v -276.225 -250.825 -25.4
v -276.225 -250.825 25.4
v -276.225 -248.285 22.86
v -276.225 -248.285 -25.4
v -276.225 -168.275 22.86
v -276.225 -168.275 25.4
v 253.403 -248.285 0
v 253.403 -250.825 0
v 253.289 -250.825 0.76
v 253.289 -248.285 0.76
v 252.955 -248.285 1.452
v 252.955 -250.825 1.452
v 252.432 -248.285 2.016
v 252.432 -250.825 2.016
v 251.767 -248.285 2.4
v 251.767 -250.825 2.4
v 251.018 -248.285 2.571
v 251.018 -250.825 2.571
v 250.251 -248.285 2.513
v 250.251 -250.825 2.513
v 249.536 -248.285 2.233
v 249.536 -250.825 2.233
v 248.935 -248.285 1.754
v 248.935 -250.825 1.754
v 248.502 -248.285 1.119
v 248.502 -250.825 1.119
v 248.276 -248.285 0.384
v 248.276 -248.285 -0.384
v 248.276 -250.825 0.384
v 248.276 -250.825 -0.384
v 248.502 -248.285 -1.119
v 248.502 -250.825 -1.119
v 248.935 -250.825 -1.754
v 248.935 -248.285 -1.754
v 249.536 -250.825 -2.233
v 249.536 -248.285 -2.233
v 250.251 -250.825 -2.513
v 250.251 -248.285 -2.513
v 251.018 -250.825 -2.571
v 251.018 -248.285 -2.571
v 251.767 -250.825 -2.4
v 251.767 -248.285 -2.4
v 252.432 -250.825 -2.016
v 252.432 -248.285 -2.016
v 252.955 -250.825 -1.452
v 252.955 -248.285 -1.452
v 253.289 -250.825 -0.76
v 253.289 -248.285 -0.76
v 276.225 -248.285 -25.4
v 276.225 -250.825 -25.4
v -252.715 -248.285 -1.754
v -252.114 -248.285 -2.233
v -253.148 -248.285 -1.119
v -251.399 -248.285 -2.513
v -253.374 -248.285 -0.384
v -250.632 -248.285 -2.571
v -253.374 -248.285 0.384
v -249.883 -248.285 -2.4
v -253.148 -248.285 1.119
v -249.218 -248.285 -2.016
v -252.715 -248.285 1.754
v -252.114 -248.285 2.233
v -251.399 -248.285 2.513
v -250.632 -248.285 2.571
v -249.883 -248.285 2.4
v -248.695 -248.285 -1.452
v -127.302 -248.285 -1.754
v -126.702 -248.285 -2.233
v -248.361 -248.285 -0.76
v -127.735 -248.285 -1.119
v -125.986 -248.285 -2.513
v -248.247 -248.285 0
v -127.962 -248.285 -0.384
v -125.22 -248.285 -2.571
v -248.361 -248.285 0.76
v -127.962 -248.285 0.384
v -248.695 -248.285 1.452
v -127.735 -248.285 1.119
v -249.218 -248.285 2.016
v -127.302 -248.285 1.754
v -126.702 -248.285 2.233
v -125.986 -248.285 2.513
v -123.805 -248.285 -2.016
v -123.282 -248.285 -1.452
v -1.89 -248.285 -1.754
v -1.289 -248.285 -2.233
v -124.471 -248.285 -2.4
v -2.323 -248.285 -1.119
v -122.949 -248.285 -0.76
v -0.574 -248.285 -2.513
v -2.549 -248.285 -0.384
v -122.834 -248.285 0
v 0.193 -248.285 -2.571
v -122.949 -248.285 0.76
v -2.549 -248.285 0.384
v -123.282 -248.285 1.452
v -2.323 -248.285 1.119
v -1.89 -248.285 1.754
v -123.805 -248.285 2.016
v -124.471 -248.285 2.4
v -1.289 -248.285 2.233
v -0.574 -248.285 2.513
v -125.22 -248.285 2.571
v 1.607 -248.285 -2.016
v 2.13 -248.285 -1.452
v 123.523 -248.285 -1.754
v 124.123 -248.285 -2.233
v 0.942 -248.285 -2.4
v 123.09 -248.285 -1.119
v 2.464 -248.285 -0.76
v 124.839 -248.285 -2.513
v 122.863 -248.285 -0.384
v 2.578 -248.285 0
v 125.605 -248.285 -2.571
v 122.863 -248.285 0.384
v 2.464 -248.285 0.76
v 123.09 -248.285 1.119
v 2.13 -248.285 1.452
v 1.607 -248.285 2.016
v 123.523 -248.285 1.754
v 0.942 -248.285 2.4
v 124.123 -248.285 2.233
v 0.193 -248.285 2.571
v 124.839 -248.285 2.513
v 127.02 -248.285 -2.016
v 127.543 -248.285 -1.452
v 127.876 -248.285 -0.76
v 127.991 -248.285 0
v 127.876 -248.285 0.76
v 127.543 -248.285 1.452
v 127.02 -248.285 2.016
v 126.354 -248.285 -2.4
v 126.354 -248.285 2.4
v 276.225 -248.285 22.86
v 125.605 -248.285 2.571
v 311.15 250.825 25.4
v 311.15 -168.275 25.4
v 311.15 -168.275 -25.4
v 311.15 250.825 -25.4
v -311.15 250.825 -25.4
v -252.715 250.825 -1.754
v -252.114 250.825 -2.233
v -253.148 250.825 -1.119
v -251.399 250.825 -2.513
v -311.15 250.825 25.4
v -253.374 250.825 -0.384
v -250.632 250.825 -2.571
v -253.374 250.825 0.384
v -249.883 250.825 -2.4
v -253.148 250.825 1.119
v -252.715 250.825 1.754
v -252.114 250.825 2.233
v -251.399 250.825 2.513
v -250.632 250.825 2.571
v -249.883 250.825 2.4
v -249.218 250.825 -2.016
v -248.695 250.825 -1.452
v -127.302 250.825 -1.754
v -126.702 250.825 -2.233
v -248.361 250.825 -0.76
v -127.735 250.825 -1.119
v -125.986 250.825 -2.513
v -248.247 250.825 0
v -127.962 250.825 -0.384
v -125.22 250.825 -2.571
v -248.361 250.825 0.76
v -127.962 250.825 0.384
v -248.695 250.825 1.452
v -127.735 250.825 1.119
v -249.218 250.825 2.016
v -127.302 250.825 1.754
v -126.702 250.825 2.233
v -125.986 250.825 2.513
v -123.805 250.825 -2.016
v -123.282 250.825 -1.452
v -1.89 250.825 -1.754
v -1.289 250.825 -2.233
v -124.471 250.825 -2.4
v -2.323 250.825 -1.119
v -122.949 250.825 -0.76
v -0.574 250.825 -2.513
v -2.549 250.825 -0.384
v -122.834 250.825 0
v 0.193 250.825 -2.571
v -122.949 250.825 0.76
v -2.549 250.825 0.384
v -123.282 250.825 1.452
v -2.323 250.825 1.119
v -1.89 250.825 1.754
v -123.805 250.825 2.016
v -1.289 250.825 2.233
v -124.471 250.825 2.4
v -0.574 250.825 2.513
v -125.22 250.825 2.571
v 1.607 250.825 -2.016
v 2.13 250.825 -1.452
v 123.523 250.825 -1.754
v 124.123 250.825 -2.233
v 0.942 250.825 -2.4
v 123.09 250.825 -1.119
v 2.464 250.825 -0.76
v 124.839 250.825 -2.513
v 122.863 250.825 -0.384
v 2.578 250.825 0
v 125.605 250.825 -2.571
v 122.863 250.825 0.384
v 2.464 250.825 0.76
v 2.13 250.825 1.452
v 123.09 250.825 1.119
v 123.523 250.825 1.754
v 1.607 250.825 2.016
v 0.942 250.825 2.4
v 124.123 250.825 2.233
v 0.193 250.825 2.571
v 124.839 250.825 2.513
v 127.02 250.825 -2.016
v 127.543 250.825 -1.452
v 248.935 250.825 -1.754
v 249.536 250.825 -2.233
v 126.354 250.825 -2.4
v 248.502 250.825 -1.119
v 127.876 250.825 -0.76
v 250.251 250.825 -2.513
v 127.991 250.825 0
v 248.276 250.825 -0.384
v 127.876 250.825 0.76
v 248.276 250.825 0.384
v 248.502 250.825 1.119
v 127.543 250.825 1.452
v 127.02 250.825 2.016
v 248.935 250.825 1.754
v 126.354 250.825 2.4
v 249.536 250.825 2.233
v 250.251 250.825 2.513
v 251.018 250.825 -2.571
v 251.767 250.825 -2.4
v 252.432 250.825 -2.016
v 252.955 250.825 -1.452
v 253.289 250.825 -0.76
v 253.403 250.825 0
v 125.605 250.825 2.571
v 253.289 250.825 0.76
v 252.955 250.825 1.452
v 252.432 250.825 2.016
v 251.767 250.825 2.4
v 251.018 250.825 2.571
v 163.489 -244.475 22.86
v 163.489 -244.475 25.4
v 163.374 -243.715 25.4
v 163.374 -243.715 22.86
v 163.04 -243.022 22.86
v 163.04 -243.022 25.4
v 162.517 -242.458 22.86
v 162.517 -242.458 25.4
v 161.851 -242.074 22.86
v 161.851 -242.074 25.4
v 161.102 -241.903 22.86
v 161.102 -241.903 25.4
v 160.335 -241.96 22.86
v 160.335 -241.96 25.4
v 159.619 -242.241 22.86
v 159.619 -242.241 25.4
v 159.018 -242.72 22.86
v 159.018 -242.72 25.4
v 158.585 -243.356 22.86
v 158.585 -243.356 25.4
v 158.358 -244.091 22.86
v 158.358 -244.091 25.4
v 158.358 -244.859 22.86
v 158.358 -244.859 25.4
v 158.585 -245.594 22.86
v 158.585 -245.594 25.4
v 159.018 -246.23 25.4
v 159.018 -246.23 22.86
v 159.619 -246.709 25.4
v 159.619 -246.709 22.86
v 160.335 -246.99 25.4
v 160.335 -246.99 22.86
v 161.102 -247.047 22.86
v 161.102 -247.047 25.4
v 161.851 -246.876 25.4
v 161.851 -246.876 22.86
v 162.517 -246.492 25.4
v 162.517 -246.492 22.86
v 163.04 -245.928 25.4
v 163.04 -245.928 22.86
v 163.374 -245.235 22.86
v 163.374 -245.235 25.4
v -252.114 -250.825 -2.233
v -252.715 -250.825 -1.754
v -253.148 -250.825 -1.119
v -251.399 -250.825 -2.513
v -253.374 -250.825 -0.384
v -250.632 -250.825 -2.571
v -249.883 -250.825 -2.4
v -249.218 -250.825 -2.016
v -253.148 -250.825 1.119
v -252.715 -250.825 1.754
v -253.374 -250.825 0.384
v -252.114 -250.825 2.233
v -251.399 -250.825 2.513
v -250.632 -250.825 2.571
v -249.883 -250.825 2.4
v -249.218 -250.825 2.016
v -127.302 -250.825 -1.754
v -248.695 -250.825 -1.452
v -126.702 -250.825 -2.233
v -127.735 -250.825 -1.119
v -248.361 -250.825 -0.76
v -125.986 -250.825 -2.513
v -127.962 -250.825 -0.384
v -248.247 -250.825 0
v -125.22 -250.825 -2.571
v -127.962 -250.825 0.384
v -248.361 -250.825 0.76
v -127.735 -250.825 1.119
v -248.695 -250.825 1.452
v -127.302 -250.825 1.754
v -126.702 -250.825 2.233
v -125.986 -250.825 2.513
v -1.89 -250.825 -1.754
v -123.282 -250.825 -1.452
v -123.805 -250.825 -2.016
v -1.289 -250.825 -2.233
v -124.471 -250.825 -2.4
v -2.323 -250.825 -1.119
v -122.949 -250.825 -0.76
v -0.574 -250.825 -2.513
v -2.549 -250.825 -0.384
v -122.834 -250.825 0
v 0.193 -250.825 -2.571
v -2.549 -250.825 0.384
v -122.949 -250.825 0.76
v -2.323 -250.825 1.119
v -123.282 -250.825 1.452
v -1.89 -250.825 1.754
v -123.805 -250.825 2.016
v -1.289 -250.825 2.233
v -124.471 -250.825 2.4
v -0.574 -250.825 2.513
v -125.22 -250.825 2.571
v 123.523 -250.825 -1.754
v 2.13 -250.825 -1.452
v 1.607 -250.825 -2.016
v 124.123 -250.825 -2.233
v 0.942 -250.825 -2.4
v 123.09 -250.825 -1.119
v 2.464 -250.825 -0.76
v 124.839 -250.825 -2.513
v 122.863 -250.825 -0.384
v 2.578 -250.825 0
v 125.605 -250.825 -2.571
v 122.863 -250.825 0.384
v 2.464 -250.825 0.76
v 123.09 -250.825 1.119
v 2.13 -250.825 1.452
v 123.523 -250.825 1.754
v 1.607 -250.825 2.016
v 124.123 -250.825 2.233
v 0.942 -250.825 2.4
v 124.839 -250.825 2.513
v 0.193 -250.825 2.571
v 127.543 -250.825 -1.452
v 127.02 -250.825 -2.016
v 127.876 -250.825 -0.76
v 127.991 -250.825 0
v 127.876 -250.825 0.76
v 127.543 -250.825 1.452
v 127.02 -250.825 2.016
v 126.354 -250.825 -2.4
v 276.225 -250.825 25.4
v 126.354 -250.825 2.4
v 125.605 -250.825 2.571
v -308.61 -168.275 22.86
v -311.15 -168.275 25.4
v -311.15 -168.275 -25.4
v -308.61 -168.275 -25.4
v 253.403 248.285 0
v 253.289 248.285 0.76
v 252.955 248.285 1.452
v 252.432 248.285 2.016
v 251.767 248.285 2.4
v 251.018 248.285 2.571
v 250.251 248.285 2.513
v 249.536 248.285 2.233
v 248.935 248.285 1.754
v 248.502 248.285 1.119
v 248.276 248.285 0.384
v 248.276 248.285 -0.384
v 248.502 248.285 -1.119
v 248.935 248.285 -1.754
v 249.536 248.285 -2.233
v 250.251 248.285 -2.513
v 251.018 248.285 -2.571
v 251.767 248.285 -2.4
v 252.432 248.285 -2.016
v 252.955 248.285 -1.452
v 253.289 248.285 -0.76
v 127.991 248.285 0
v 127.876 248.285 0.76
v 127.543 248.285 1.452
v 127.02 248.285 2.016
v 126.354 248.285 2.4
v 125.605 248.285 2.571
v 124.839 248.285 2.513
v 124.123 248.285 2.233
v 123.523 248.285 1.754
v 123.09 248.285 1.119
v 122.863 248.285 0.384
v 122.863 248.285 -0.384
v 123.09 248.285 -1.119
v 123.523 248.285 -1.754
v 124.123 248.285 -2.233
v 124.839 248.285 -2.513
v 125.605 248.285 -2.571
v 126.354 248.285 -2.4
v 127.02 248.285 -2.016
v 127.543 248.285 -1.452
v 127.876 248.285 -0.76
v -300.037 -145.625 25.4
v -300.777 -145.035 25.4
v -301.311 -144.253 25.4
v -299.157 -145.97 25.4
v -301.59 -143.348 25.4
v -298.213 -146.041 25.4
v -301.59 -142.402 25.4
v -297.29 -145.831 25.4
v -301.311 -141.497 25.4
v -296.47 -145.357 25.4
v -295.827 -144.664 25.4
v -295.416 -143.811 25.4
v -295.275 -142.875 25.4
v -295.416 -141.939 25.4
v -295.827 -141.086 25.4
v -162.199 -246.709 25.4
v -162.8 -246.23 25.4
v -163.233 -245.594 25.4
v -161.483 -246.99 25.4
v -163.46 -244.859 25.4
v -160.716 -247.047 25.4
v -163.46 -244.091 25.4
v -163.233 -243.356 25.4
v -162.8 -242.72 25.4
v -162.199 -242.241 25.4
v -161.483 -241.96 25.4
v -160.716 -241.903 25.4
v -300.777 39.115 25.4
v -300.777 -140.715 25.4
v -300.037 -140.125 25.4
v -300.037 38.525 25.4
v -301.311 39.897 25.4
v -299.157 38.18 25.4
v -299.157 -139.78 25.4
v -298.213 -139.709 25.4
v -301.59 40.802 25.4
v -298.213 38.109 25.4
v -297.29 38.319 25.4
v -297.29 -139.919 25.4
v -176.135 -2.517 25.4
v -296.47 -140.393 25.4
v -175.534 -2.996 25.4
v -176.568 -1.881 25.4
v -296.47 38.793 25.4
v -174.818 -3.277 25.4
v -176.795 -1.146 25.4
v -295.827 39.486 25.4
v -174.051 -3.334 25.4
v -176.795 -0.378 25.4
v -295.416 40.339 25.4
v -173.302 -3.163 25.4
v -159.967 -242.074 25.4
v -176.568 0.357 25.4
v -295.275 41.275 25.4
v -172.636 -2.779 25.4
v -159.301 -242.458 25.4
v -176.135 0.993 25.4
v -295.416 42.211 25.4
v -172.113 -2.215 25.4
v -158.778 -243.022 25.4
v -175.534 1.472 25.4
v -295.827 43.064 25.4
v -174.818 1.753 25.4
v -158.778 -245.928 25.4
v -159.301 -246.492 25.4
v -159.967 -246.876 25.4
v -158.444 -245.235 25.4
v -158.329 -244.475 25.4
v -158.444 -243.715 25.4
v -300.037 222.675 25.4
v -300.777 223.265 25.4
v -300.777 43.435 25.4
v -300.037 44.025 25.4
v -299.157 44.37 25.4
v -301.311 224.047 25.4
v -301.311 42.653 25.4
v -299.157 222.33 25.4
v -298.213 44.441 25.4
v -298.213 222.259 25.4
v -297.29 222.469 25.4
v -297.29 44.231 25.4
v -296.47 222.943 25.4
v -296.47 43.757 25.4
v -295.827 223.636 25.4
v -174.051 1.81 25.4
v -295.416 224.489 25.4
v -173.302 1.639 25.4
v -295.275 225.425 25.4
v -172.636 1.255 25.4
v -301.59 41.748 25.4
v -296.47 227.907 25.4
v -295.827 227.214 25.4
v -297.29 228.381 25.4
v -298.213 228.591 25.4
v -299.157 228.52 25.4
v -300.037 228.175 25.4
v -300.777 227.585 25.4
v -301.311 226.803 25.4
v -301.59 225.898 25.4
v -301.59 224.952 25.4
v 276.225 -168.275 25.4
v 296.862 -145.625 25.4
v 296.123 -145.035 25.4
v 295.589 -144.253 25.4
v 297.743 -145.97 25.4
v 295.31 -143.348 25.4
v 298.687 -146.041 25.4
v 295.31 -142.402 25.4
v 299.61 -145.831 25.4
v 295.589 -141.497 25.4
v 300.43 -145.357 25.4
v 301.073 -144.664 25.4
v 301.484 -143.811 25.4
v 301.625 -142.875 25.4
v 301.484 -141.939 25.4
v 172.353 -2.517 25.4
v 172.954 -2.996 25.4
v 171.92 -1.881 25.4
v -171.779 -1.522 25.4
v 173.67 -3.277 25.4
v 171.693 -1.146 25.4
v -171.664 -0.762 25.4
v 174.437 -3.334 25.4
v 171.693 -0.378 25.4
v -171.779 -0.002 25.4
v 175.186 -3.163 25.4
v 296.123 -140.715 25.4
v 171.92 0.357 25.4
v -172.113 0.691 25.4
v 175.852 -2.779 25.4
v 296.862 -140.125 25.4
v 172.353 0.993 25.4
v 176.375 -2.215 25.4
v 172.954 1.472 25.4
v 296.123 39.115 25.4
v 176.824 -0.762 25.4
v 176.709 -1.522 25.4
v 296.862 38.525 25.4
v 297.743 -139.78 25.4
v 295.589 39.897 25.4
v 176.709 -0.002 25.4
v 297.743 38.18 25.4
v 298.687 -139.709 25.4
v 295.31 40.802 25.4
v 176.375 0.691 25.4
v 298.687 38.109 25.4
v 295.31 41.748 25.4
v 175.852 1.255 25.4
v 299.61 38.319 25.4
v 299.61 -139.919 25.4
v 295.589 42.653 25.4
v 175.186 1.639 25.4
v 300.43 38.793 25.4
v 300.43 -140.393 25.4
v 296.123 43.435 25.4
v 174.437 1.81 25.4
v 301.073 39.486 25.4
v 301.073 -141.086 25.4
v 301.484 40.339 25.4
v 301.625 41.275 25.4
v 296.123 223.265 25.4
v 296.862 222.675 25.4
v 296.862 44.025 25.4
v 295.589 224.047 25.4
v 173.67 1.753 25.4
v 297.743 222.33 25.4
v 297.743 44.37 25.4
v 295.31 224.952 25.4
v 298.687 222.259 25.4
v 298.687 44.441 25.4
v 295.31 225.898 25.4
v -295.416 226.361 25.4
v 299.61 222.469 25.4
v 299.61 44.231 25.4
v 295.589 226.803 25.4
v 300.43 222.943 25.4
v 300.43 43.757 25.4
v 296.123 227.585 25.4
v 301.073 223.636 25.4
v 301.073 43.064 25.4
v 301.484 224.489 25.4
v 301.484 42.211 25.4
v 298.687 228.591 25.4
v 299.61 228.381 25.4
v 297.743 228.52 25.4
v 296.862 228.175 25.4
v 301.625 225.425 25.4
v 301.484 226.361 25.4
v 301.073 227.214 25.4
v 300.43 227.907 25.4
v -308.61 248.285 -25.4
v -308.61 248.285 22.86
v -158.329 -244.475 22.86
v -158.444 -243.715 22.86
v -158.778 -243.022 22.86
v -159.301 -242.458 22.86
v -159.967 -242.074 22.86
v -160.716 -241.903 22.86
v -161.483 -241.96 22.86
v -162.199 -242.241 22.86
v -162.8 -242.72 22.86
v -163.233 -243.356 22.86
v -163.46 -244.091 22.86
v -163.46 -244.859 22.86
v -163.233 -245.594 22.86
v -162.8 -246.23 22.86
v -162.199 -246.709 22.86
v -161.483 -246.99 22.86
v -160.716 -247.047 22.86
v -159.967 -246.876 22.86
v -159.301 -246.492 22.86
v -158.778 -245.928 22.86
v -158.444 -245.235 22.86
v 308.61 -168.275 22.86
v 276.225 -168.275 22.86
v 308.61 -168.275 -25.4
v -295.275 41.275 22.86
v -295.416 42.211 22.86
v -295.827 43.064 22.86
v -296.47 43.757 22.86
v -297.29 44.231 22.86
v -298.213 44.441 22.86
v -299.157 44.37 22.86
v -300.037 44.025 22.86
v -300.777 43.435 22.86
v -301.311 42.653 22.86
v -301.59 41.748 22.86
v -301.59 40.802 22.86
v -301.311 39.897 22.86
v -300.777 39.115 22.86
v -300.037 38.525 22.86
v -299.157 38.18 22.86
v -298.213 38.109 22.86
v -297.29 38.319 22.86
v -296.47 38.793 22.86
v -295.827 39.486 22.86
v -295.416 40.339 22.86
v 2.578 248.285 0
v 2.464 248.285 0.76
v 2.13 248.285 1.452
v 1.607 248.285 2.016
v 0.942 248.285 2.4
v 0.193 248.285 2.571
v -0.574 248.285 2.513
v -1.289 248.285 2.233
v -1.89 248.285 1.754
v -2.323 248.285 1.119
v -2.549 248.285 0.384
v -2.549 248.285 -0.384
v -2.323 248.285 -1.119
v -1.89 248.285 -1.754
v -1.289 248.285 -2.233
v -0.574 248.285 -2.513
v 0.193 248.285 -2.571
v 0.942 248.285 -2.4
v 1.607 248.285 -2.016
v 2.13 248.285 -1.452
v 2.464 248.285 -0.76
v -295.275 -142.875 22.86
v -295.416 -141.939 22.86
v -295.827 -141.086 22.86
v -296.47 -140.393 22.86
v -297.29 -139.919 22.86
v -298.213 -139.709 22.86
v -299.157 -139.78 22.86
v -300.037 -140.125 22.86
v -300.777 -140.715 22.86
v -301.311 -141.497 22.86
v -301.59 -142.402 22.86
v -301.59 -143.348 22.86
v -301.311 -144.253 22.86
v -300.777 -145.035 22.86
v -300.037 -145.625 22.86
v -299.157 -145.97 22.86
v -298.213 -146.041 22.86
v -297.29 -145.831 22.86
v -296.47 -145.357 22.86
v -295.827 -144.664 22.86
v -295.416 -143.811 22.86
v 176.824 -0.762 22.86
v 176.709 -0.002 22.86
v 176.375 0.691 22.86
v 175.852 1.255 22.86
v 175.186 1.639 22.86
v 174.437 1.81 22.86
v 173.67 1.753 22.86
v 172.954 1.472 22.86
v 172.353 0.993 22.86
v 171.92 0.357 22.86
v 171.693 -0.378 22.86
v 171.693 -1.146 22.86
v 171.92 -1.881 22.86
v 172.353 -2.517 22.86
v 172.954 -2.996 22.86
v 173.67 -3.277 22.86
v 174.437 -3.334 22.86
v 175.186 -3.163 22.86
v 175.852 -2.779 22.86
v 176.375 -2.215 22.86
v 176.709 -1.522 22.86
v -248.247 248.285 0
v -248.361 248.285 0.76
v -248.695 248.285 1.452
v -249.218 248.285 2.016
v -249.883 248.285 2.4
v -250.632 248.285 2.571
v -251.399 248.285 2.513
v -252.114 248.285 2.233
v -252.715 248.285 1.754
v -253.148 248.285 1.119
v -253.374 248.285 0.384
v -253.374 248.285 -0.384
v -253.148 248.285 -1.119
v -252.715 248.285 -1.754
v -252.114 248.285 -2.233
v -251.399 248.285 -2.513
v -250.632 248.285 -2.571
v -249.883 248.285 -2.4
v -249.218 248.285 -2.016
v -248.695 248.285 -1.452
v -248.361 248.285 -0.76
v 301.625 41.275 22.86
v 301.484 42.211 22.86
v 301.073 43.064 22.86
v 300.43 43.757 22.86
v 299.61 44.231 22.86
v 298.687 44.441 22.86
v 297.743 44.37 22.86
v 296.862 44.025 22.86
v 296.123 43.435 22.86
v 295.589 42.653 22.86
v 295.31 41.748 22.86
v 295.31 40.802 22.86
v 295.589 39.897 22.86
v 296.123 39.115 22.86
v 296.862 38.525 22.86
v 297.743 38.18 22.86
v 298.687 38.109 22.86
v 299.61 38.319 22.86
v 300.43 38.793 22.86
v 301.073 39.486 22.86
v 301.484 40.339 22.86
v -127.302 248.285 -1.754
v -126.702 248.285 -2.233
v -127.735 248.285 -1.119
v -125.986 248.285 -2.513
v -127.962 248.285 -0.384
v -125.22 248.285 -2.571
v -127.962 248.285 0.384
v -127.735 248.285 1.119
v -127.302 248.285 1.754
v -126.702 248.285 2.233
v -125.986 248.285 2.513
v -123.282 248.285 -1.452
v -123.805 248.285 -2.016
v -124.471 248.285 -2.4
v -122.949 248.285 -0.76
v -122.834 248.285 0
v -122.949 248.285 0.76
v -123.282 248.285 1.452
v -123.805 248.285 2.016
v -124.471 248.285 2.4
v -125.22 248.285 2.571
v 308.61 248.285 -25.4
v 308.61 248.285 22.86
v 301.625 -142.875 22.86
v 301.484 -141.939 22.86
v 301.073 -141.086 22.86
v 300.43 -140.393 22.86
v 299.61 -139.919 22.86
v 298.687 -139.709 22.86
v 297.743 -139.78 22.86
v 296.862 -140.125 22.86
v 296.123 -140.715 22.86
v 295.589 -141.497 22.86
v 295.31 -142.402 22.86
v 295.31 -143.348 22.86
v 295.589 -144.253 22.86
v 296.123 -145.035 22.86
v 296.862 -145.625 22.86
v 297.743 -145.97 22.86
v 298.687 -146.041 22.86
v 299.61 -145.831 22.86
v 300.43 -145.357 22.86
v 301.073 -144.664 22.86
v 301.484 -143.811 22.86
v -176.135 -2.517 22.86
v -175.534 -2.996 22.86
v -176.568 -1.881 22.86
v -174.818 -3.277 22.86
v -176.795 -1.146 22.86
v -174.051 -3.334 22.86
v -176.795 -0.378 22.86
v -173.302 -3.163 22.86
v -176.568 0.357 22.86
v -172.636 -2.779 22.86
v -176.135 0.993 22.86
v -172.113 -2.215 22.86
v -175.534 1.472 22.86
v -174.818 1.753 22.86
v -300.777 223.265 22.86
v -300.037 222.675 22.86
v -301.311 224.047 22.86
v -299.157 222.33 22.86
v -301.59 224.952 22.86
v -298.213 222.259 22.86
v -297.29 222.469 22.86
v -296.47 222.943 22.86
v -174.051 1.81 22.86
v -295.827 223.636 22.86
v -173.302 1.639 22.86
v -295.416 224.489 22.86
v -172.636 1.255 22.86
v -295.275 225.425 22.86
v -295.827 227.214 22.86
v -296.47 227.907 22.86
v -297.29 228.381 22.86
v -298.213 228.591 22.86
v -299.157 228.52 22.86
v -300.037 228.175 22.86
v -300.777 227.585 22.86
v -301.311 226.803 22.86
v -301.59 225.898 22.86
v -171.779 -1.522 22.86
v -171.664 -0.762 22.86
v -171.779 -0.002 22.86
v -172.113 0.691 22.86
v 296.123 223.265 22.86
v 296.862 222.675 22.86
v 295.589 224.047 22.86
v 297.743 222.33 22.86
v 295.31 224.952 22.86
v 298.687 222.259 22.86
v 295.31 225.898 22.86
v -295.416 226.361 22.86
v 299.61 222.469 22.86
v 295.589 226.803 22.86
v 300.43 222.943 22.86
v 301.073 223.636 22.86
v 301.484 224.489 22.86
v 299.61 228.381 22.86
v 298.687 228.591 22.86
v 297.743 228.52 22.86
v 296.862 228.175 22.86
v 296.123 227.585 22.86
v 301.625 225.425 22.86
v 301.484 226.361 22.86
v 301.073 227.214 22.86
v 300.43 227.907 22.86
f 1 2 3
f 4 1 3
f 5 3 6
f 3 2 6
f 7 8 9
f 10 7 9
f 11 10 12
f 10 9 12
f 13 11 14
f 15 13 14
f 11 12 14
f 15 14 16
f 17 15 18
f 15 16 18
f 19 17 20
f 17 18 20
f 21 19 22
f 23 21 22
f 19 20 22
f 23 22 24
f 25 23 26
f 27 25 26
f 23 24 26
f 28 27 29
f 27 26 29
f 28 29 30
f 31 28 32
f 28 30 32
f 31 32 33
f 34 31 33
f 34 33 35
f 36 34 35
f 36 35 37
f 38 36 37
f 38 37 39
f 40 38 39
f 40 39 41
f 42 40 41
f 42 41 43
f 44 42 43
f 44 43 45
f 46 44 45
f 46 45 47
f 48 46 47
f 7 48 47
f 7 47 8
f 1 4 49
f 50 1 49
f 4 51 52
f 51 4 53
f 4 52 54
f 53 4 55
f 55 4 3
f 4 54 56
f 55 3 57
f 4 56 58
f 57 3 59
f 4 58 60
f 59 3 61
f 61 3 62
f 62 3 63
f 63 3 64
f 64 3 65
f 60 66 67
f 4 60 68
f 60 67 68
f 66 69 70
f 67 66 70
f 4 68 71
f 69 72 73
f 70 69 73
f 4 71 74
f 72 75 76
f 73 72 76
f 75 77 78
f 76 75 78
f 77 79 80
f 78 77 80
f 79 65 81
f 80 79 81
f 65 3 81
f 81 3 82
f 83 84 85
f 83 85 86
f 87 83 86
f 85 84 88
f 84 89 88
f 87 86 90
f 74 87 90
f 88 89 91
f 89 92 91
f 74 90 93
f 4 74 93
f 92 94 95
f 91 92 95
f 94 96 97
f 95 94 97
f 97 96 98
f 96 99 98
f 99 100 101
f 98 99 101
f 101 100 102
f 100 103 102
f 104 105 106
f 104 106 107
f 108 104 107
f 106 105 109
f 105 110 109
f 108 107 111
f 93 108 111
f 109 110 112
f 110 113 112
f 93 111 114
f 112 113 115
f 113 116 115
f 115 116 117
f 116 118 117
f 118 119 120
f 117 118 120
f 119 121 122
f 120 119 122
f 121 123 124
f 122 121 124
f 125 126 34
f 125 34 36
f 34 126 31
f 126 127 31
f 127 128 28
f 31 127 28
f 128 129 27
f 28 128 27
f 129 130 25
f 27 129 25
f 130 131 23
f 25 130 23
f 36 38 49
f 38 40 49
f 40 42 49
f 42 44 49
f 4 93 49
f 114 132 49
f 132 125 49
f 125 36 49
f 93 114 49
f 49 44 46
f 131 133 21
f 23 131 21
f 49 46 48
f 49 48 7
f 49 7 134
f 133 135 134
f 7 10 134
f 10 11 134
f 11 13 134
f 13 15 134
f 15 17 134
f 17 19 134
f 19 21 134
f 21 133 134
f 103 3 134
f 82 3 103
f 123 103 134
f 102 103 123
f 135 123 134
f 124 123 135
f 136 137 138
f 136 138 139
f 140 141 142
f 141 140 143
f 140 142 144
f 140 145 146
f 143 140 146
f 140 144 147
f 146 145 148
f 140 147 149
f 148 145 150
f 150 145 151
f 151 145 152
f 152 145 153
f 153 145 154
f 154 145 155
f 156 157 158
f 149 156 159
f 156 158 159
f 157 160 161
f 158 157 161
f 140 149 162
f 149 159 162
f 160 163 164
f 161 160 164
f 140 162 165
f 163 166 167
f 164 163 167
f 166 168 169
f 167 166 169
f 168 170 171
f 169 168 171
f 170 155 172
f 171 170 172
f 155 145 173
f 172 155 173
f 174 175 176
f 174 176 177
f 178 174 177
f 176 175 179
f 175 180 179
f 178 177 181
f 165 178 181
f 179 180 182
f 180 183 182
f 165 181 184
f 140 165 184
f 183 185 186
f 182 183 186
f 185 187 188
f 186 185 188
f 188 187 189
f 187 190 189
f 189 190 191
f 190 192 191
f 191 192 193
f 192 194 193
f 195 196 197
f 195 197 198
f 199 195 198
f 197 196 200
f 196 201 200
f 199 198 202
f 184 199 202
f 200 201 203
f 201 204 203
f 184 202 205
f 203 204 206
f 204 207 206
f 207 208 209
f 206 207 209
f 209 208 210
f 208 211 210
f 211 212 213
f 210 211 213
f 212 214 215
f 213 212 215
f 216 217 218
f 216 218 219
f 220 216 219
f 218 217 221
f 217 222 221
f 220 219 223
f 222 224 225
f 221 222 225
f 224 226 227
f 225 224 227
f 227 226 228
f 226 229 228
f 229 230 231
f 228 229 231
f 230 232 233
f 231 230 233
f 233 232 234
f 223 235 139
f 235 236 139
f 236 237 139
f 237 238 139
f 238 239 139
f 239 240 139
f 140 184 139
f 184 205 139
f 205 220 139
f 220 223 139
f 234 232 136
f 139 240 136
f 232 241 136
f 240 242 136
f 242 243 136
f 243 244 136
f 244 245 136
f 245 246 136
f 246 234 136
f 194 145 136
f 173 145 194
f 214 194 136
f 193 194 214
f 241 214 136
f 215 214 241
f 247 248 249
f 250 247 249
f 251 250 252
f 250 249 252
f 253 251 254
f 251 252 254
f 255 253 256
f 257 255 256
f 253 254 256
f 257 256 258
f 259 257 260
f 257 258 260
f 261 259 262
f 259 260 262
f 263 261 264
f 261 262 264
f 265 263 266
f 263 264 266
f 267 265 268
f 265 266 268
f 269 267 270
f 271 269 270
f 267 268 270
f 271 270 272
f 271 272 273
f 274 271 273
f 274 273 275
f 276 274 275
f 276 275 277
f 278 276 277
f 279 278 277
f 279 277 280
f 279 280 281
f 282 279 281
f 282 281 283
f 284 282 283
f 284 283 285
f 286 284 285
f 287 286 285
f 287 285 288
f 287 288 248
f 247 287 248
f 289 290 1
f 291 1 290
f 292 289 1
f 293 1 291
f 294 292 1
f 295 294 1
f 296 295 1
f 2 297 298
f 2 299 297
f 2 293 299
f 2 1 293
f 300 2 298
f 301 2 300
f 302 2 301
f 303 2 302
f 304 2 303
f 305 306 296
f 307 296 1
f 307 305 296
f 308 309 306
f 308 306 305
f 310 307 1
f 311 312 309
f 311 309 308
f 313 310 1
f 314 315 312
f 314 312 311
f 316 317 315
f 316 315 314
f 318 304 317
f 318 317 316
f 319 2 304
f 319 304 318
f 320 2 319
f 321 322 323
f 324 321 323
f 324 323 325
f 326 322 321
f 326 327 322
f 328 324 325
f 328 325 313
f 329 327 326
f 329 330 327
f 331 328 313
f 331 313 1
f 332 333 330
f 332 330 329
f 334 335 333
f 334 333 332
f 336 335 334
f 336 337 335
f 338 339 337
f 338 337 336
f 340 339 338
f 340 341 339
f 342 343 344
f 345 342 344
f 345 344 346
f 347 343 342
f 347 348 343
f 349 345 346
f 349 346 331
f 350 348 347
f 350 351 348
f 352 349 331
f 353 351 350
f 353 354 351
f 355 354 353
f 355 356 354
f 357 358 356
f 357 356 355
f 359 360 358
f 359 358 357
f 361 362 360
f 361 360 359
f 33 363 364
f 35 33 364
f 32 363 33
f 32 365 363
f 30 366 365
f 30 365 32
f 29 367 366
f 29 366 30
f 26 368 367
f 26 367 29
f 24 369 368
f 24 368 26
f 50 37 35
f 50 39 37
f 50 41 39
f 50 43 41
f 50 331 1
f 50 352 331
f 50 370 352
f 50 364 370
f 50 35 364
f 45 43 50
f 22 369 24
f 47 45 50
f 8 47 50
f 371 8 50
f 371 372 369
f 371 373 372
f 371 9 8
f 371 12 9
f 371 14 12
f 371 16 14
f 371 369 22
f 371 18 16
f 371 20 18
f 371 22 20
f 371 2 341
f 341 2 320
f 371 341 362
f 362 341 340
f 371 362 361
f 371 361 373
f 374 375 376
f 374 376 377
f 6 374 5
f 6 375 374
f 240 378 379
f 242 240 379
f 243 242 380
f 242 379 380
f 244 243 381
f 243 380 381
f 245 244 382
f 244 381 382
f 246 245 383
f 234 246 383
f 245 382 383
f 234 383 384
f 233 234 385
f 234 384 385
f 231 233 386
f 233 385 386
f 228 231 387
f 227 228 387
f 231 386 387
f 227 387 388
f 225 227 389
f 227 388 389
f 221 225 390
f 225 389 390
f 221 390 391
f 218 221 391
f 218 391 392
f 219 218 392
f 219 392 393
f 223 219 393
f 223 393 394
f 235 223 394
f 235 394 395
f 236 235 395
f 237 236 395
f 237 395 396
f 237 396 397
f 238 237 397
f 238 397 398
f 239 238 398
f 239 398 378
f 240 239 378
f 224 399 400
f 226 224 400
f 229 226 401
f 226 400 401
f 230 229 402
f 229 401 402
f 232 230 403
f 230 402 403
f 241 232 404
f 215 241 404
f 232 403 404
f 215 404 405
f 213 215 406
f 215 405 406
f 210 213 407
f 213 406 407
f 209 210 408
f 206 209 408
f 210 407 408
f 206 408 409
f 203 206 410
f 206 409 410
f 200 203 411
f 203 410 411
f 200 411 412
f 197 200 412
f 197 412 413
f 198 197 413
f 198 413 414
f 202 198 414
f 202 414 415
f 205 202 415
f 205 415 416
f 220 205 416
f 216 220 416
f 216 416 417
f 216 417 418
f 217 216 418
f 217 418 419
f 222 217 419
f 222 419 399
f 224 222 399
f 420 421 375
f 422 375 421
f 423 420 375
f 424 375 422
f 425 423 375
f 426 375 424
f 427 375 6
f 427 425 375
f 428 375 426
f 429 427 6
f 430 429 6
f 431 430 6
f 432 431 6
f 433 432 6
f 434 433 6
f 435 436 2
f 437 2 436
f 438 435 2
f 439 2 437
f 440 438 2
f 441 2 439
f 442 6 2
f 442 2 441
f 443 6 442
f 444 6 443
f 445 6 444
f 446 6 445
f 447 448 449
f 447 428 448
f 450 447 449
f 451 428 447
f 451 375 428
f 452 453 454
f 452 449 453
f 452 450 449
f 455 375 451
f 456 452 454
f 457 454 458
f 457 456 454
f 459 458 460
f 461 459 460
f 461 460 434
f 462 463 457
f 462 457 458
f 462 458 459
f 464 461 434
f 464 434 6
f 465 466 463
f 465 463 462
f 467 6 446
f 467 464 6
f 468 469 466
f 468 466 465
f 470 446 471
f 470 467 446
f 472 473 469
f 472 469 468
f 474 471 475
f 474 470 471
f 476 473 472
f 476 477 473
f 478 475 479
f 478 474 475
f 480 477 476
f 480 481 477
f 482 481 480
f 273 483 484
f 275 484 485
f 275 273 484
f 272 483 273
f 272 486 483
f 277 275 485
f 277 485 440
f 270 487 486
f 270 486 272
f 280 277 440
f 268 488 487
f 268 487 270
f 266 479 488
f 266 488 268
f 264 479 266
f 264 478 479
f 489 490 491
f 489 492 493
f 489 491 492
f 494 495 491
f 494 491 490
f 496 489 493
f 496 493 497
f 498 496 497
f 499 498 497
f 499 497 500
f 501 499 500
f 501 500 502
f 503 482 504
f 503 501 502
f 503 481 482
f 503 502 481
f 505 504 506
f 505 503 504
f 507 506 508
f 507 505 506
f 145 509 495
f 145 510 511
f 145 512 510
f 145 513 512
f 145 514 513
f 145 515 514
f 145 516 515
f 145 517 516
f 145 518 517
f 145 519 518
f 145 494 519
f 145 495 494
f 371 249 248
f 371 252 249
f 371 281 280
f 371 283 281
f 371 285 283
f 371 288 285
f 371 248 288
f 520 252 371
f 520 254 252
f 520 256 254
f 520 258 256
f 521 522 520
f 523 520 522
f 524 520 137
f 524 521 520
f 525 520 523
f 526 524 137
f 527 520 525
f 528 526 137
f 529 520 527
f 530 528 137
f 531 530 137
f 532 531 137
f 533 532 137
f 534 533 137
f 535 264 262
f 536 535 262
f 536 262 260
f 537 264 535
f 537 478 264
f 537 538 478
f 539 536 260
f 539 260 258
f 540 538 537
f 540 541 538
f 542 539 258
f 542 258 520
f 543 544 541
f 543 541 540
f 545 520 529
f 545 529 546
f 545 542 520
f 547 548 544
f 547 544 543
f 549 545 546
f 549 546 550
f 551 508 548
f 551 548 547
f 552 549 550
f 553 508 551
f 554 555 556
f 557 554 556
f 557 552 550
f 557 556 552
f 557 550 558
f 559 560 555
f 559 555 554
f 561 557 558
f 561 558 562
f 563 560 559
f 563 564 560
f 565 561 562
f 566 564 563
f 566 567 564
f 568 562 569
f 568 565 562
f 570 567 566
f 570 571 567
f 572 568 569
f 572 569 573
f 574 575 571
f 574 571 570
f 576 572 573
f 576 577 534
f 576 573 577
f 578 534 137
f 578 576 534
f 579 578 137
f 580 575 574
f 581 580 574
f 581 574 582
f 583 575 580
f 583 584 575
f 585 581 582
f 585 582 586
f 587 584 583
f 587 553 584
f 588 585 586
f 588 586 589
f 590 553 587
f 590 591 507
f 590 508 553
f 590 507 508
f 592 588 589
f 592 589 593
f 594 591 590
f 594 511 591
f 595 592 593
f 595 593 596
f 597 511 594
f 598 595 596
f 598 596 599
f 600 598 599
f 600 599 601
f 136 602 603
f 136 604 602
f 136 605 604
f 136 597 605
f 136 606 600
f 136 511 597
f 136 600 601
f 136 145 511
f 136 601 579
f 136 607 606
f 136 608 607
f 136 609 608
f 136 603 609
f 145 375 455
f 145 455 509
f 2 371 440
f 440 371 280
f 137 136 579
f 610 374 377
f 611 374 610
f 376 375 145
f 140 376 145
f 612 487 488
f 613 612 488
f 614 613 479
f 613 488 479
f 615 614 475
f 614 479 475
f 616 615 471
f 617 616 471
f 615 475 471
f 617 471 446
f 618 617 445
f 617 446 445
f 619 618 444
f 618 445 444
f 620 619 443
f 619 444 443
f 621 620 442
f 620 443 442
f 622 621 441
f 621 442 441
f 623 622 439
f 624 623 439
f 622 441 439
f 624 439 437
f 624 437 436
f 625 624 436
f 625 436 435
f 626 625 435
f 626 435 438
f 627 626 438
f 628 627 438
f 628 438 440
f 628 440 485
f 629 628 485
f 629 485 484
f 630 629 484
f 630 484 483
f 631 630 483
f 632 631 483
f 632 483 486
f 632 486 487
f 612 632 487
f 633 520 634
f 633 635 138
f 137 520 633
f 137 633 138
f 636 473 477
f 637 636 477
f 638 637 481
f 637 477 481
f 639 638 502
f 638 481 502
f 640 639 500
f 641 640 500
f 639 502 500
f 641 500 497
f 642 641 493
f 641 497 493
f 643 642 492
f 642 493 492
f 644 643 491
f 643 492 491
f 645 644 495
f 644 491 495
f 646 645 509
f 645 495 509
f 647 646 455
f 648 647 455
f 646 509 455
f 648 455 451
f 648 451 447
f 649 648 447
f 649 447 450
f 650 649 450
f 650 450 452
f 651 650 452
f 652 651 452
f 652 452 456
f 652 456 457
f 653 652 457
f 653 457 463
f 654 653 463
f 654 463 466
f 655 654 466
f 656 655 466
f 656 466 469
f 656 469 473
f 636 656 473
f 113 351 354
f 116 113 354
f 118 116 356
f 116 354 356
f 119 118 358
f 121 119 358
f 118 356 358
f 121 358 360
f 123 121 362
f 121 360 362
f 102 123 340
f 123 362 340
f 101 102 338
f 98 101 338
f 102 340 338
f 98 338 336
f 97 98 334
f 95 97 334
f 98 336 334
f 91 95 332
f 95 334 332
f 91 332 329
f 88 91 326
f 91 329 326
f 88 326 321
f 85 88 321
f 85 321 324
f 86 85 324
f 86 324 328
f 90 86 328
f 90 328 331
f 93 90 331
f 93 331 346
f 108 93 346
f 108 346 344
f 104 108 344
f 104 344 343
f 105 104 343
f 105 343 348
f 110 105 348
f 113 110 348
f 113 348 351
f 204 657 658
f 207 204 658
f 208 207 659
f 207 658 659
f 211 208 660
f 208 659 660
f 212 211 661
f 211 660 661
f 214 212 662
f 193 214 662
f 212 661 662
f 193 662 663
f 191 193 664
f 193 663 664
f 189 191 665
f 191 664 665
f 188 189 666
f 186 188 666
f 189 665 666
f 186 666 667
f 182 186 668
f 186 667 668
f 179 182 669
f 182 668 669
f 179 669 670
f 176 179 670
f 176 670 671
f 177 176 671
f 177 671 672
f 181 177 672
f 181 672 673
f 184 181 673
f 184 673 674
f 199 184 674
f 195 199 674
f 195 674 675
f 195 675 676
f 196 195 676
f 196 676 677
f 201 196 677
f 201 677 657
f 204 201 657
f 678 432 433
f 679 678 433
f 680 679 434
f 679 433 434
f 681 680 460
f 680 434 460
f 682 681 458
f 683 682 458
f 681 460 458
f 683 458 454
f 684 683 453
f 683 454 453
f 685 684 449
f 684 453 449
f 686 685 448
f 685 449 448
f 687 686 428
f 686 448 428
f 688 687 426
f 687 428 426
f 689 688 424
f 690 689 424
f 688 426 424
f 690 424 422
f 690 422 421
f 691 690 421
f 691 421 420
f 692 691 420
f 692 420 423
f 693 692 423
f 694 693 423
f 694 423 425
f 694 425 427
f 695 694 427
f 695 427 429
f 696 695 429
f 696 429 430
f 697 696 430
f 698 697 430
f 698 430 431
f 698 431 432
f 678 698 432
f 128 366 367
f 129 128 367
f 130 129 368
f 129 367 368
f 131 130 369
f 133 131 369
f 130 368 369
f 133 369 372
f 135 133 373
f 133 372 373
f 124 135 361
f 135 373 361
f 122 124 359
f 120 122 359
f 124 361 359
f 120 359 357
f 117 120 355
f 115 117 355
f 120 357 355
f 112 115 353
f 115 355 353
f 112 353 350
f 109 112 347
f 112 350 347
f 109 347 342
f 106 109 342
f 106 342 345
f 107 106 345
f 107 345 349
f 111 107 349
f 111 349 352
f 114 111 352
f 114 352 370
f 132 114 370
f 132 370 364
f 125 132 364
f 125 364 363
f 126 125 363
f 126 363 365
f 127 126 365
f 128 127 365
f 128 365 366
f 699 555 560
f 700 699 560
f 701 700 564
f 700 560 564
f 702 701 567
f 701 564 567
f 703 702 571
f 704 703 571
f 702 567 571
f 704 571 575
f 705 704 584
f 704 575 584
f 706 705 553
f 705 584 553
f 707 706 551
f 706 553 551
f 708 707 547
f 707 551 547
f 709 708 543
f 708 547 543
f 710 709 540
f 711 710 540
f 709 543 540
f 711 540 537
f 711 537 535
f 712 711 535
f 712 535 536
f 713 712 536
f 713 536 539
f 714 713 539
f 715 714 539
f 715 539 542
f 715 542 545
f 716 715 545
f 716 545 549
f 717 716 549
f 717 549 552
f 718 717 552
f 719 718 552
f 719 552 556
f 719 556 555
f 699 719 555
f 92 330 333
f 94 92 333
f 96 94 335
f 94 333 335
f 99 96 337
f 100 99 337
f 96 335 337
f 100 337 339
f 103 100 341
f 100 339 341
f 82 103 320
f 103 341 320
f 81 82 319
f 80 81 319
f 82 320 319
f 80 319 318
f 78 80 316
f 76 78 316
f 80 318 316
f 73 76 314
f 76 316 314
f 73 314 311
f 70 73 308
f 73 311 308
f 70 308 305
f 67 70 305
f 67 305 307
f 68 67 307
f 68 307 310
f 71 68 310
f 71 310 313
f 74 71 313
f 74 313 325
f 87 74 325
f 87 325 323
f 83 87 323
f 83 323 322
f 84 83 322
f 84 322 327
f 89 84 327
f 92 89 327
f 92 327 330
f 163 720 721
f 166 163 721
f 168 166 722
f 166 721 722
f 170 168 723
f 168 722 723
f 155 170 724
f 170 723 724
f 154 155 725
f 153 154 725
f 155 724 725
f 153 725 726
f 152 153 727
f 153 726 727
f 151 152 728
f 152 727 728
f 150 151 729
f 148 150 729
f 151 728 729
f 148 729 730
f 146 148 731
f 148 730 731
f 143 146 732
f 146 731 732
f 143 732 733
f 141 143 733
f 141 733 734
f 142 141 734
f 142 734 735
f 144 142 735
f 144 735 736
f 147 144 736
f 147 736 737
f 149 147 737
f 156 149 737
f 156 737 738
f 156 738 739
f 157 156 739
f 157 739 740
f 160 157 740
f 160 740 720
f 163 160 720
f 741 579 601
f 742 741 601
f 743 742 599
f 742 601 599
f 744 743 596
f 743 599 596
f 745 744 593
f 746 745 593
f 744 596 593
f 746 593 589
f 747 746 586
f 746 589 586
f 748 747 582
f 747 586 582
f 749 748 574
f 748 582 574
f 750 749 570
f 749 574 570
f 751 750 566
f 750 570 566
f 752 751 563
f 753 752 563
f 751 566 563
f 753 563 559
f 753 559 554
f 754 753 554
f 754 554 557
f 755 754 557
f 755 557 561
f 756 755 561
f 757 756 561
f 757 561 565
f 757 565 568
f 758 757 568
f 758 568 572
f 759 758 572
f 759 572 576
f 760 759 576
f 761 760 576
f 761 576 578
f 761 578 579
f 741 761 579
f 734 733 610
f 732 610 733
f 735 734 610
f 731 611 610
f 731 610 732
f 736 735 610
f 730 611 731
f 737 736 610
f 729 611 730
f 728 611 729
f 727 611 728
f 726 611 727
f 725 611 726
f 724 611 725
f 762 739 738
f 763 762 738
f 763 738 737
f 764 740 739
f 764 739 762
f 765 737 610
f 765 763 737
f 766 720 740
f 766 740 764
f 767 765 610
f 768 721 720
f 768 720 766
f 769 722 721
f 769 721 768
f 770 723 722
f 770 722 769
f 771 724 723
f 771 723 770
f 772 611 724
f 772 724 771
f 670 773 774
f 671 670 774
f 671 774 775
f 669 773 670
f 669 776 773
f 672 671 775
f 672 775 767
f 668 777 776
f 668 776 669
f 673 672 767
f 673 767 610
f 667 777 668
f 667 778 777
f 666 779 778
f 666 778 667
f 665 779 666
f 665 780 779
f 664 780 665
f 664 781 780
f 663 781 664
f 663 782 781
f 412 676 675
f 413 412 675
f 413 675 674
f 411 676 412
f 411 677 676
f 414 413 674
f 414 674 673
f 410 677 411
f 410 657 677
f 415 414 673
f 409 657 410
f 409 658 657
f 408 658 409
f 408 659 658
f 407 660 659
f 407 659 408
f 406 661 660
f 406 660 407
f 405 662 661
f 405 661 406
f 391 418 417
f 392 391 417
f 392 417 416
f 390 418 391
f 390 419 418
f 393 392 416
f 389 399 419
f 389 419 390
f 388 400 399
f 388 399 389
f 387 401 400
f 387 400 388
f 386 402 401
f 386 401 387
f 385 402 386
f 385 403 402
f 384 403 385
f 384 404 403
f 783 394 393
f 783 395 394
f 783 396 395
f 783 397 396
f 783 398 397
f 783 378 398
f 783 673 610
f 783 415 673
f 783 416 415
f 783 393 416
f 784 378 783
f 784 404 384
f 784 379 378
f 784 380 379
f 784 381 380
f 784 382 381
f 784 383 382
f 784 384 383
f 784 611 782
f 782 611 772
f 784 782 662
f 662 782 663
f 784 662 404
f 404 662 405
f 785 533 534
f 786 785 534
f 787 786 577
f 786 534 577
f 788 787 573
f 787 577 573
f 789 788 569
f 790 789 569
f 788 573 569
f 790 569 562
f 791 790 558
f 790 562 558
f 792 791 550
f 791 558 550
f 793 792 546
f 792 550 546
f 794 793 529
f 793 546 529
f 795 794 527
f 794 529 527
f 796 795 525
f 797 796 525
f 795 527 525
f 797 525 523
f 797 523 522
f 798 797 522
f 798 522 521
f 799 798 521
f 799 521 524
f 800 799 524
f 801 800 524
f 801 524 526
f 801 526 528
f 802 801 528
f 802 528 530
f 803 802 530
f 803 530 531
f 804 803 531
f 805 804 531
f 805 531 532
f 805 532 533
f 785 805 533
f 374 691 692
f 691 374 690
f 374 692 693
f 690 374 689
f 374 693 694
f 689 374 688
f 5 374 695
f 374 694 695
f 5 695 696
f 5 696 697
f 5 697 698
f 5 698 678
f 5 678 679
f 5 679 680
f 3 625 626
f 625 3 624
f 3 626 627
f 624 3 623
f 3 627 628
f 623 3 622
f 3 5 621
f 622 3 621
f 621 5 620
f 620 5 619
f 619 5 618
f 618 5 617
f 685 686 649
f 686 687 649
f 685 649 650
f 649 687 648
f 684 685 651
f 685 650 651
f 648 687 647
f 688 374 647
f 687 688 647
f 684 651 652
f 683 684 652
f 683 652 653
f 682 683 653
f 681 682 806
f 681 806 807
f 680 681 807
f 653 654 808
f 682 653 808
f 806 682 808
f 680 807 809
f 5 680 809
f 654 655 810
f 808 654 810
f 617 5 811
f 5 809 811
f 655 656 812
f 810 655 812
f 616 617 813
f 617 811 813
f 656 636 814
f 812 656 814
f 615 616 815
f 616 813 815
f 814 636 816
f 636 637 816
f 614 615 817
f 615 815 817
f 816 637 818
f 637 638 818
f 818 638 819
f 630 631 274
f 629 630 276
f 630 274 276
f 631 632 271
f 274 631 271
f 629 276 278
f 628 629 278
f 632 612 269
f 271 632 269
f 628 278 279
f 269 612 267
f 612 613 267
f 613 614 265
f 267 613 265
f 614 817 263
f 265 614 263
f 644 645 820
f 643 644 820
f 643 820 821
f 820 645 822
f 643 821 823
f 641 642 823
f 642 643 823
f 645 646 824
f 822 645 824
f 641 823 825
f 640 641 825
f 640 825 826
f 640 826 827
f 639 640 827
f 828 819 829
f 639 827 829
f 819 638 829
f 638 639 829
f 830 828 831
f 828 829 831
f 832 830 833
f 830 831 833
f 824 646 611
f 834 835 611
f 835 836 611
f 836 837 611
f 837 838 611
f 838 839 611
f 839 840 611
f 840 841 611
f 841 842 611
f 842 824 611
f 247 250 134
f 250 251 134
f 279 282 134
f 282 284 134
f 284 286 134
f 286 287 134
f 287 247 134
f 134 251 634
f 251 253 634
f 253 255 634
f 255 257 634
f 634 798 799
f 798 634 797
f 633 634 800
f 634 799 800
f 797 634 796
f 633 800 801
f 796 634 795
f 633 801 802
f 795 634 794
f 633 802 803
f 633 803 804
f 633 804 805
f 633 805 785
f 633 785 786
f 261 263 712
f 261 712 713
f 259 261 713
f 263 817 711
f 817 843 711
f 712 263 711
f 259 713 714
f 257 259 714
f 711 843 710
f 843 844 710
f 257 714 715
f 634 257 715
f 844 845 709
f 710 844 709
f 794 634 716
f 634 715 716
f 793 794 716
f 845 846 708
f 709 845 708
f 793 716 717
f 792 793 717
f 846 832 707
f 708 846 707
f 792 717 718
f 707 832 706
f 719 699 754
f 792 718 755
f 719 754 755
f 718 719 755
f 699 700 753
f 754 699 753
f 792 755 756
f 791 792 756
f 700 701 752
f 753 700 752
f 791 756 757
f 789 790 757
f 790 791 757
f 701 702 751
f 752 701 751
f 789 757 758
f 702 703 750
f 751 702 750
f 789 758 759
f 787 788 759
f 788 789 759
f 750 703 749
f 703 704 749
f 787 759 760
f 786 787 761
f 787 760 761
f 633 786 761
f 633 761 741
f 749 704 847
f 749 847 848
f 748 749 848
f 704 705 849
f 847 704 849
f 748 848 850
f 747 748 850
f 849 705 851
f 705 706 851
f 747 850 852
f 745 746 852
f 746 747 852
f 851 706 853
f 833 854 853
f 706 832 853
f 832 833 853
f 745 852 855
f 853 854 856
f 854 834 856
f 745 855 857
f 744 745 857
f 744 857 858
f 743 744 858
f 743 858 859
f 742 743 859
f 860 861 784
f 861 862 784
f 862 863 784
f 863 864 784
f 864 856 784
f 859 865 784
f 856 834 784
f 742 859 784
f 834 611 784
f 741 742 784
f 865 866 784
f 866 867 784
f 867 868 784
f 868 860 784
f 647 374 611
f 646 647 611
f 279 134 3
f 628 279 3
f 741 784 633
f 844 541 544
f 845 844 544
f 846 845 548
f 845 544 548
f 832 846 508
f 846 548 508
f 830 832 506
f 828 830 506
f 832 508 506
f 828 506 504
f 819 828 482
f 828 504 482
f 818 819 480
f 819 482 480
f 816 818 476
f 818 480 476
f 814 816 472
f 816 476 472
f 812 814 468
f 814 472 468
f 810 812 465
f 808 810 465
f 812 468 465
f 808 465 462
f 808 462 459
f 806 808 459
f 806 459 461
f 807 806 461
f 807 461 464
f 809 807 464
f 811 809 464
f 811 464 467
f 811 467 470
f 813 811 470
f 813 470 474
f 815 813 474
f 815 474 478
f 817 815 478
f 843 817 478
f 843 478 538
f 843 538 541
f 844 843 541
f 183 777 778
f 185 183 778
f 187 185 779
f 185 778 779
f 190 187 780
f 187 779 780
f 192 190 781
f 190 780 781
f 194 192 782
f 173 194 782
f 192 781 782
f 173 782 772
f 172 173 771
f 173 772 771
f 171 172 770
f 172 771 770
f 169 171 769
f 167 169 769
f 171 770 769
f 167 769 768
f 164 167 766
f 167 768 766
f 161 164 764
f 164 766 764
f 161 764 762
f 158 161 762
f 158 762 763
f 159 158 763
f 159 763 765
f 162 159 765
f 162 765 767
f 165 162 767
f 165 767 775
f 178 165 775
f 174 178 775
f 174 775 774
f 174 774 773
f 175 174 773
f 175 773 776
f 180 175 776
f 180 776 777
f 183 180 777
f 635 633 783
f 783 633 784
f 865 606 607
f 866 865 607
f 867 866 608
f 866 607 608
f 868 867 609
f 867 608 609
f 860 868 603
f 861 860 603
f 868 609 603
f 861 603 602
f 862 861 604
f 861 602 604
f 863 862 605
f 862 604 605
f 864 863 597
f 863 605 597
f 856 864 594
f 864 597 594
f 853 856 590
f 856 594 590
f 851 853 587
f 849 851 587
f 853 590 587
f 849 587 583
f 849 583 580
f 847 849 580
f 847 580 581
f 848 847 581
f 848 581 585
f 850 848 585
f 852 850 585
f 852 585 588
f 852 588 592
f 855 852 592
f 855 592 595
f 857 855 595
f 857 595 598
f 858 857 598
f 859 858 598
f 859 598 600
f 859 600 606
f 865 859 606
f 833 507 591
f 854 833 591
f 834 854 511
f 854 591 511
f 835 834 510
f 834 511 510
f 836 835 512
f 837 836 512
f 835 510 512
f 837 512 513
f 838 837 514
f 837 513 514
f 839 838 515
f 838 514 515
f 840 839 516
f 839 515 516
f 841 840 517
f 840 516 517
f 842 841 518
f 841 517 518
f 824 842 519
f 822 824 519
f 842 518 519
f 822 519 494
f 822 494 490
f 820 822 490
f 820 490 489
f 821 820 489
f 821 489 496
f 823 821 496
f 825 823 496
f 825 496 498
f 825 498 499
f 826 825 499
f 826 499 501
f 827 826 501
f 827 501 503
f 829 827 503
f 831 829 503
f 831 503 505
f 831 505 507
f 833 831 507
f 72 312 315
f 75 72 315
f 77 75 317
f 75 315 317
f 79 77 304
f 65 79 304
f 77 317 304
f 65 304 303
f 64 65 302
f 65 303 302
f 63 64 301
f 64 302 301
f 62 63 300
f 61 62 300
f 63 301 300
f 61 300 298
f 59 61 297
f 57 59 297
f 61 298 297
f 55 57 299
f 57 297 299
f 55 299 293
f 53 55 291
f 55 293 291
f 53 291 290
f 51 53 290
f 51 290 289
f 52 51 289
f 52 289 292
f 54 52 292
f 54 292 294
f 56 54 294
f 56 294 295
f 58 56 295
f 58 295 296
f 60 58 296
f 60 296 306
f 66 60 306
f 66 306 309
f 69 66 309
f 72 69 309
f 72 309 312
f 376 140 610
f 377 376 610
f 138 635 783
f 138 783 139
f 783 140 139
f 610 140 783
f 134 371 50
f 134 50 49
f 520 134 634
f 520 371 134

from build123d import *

# Parameters (mm, degrees)
F0_W     = 622.3
F0_H     = 501.65
F1_DEPTH = 25.4
F2_T     = -2.54
F3_W     = 34.925
F3_H     = 82.55
F3_R     = 2.579688
F3_R_2   = 3.175
F4_DEPTH = 50.801
F5_R     = 2.5781
F6_DEPTH = 501.651


with BuildPart() as f1:
    # F0 (on Top) → F1 (new body, symmetric)
    with BuildSketch(Plane.XY):
        Rectangle(F0_W, F0_H)
    extrude(amount=F1_DEPTH, both=True)

    # F2
    f2_openings = [f1.faces().sort_by_distance(p)[0] for p in [
        (0, 0, -25.4),
    ]]
    offset(amount=F2_T, openings=f2_openings)

    # F3 (on face) → F4 (cut, through all)
    with BuildSketch(Plane.XY.offset(25.4)):
        with Locations((-293.6875, -209.55)):
            Rectangle(F3_W, F3_H)
        with Locations((293.6875, -209.55)):
            Rectangle(F3_W, F3_H)
        with Locations((174.244, -0.762)):
            Circle(F3_R)
        with Locations((-174.244, -0.762)):
            Circle(F3_R)
        with Locations((-160.909, -244.475)):
            Circle(F3_R)
        with Locations((160.909, -244.475)):
            Circle(F3_R)
        with Locations((-298.45, 225.425)):
            Circle(F3_R_2)
        with Locations((-298.45, 41.275)):
            Circle(F3_R_2)
        with Locations((-298.45, -142.875)):
            Circle(F3_R_2)
        with Locations((298.45, -142.875)):
            Circle(F3_R_2)
        with Locations((298.45, 41.275)):
            Circle(F3_R_2)
        with Locations((298.45, 225.425)):
            Circle(F3_R_2)
    extrude(amount=-F4_DEPTH, mode=Mode.SUBTRACT)

    # F5 (on face) → F6 (cut, through all)
    with BuildSketch(Plane.XZ.offset(250.825)):
        Circle(F5_R)
        with Locations((125.4125, 0)):
            Circle(F5_R)
        with Locations((250.825, 0)):
            Circle(F5_R)
        with Locations((-125.4125, 0)):
            Circle(F5_R)
        with Locations((-250.825, 0)):
            Circle(F5_R)
    extrude(amount=-F6_DEPTH, mode=Mode.SUBTRACT)


solid = f1.part
